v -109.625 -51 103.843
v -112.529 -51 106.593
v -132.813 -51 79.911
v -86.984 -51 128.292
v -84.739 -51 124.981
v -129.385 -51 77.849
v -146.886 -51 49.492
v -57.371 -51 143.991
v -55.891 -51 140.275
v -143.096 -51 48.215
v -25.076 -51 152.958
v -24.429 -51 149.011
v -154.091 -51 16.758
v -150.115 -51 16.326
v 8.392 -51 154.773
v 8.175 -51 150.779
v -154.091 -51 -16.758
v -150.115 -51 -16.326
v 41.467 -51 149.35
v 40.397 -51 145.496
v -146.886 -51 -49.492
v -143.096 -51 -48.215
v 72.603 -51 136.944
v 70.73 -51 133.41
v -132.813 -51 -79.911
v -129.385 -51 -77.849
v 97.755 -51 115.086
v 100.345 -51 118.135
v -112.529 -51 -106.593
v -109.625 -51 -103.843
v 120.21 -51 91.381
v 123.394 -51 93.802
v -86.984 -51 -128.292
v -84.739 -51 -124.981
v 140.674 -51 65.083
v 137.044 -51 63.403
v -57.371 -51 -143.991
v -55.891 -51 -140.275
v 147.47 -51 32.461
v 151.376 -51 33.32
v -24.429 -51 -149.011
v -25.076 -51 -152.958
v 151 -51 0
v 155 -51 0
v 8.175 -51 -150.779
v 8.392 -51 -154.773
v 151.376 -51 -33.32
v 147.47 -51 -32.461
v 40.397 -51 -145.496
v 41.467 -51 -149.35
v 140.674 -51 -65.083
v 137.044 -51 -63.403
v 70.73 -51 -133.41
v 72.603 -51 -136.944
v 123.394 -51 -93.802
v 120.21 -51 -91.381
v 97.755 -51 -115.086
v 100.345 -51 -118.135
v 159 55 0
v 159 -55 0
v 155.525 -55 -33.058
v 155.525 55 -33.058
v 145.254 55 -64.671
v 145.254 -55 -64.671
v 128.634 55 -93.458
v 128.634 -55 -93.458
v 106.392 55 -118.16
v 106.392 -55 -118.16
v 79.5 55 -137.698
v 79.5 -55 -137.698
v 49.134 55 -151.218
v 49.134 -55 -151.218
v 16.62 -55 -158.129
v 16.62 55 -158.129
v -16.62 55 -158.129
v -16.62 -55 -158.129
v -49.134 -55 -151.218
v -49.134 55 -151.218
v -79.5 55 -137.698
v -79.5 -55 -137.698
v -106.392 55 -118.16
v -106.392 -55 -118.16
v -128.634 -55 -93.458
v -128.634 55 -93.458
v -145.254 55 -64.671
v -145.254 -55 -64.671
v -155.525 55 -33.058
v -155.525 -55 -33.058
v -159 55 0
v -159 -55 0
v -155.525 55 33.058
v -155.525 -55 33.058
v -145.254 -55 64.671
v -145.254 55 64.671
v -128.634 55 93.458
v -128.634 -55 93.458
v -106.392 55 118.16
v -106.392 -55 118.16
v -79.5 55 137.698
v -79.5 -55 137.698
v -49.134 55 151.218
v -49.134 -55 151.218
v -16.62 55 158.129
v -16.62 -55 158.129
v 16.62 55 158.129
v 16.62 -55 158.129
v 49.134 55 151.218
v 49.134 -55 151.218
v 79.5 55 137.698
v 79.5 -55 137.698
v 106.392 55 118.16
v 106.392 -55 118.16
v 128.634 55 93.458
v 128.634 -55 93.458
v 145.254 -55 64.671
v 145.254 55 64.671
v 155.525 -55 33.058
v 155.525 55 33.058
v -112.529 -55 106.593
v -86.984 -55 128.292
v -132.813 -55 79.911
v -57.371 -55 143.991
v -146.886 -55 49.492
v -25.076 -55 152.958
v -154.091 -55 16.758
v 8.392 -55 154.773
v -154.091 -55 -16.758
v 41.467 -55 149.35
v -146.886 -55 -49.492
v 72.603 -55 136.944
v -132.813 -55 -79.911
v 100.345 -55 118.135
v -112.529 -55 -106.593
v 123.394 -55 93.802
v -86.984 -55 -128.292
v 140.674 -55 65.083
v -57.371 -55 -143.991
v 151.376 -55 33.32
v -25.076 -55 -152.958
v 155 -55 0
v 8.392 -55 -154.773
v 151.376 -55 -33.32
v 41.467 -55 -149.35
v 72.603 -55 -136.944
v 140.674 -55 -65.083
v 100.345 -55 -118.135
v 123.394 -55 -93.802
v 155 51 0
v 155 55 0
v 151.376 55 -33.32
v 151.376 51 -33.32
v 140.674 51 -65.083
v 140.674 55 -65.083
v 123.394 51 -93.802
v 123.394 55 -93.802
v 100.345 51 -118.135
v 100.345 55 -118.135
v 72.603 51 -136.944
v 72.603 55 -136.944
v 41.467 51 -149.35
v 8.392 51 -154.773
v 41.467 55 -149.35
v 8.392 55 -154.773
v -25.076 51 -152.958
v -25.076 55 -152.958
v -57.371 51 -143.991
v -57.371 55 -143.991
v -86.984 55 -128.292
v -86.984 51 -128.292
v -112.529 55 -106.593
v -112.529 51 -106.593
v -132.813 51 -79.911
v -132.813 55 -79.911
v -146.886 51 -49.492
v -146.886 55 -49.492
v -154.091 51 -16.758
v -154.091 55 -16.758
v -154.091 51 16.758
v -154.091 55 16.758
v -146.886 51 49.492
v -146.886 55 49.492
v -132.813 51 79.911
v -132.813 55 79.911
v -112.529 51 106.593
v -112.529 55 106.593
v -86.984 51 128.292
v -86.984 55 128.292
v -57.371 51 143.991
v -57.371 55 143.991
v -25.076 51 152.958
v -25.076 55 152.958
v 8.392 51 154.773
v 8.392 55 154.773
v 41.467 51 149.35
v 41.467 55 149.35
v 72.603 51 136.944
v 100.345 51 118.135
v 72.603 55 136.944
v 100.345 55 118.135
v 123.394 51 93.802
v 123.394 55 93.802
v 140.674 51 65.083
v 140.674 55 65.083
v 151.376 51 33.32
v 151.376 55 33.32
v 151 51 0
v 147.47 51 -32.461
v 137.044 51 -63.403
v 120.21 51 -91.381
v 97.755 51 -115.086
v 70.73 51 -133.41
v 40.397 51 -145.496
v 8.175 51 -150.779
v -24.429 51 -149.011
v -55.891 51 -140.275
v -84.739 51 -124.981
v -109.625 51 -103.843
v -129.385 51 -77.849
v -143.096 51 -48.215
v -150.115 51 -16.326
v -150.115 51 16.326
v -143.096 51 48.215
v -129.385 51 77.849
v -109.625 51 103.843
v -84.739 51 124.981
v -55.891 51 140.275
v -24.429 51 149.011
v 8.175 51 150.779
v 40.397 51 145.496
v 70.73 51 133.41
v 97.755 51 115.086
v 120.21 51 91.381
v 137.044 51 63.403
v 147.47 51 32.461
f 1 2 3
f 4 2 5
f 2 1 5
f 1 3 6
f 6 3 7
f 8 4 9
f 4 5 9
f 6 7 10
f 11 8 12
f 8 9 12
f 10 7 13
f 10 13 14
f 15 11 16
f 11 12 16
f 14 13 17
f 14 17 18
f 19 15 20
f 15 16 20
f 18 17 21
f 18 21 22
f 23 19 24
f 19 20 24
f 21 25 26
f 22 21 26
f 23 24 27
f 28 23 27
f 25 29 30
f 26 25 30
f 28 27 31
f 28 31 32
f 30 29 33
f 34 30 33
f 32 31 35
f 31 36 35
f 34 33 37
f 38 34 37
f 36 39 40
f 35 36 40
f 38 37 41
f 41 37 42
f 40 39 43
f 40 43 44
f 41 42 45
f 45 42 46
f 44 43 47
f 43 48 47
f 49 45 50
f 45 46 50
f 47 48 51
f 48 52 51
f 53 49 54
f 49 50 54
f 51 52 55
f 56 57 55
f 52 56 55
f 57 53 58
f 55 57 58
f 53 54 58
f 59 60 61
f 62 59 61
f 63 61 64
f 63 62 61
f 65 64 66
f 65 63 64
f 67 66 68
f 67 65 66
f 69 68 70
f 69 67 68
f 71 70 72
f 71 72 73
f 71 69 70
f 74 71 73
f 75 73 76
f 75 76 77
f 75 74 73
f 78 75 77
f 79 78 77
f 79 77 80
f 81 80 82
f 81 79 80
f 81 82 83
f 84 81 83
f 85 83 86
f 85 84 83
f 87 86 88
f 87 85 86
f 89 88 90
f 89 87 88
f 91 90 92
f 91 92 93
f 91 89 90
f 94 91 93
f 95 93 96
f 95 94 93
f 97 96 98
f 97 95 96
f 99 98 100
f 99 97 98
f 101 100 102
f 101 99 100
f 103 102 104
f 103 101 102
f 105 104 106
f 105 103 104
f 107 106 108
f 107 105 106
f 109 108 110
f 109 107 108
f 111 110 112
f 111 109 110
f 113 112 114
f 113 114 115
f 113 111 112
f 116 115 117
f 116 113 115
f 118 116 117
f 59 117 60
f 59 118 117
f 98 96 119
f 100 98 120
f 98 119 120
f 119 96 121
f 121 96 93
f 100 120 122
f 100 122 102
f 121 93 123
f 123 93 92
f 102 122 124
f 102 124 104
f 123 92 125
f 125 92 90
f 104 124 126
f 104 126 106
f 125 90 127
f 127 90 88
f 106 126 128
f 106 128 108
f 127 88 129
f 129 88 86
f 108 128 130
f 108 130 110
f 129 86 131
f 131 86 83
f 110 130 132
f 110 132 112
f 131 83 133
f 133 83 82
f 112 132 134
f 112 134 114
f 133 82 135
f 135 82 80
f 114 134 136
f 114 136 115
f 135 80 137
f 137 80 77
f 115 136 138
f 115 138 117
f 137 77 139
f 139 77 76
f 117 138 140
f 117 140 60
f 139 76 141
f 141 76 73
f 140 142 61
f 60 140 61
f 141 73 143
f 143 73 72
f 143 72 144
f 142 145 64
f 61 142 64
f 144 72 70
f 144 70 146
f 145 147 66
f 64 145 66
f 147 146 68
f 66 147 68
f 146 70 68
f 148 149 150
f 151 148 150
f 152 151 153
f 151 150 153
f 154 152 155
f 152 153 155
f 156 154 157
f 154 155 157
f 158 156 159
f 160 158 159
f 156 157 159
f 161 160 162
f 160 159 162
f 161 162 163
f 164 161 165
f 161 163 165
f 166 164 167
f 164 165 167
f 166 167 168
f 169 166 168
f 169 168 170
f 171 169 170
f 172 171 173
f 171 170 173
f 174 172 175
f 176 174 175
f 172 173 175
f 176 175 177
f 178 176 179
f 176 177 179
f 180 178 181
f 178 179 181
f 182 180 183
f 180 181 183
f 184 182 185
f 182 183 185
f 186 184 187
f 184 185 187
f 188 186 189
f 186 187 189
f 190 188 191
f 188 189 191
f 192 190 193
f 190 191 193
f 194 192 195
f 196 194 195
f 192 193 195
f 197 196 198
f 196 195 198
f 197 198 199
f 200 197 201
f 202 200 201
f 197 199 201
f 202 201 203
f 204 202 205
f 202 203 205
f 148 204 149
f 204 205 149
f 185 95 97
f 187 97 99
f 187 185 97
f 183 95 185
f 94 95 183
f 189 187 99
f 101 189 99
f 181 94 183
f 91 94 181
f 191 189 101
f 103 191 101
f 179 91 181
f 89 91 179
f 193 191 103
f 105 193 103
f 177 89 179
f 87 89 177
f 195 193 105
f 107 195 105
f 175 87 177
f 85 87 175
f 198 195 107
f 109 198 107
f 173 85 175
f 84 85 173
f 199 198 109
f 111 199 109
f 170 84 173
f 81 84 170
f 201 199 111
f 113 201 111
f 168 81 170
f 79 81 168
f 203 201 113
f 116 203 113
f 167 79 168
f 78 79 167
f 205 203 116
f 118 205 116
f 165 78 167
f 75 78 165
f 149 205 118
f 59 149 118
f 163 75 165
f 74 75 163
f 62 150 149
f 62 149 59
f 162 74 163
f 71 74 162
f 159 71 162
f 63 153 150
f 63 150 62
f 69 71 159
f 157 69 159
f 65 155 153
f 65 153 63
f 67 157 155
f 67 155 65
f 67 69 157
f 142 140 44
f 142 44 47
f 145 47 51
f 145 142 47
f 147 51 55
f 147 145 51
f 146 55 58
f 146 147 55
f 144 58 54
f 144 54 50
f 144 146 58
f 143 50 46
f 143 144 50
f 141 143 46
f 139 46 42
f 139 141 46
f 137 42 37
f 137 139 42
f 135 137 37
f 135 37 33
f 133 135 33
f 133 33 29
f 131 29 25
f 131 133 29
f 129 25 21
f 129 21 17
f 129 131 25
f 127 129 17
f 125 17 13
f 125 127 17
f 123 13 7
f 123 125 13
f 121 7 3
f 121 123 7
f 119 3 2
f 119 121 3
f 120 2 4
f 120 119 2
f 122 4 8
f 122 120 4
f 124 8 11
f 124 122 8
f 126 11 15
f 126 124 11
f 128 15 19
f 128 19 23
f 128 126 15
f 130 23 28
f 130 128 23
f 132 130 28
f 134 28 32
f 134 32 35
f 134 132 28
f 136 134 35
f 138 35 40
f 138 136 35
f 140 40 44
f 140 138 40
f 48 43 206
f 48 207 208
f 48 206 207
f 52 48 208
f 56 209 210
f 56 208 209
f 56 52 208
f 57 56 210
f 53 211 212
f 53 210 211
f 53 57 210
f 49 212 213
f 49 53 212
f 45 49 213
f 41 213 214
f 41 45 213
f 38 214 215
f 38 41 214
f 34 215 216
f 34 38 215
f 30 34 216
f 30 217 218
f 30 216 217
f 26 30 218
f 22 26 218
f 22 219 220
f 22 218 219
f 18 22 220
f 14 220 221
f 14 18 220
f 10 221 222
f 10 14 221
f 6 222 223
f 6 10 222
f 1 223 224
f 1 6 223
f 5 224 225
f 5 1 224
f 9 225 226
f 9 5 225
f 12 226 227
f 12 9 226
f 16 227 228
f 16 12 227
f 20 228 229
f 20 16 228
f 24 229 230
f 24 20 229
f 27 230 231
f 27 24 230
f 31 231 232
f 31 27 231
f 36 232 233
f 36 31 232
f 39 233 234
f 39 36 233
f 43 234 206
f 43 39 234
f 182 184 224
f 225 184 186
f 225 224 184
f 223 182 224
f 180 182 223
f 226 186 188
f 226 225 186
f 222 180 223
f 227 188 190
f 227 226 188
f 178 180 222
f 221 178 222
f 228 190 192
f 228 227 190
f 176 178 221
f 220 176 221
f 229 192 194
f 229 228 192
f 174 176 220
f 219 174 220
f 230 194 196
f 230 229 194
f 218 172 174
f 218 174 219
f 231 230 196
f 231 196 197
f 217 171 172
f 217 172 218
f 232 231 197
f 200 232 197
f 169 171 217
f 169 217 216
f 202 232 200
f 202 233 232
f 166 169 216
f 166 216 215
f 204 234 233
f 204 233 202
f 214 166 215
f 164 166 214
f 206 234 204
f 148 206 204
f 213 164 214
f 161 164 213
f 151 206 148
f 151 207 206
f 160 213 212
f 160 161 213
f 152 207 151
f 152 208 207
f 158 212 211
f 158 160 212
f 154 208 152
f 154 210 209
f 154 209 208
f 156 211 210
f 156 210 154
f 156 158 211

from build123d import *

# Parameters (mm, degrees)
ESQUISSE2_R             = 159
ESQUISSE2_R_2           = 151
BOSS_EXTRU_1_DEPTH      = 55
ESQUISSE3_R             = 155
ENL_V_MAT_EXTRU_1_DEPTH = 4


with BuildPart() as part:
    # Esquisse2 → Boss.-Extru.1 (new body, symmetric)
    with BuildSketch(Plane(origin=(0, 0, 0), x_dir=(1, 0, 0), z_dir=(0, 1, 0))):
        Circle(ESQUISSE2_R)
        Circle(ESQUISSE2_R_2, mode=Mode.SUBTRACT)
    extrude(amount=BOSS_EXTRU_1_DEPTH, both=True)

    # Esquisse3 → Enlèv. mat.-Extru.1 (cut)
    with BuildSketch(Plane(origin=(0, 55, 0), x_dir=(1, 0, 0), z_dir=(0, 1, 0))):
        Circle(ESQUISSE3_R)
    enl_v_mat_extru_1 = extrude(amount=-ENL_V_MAT_EXTRU_1_DEPTH, mode=Mode.SUBTRACT)

    # Symétrie1: Enlèv. mat.-Extru.1 across plane
    add(enl_v_mat_extru_1.mirror(Plane.ZX), mode=Mode.SUBTRACT)


solid = part.part
